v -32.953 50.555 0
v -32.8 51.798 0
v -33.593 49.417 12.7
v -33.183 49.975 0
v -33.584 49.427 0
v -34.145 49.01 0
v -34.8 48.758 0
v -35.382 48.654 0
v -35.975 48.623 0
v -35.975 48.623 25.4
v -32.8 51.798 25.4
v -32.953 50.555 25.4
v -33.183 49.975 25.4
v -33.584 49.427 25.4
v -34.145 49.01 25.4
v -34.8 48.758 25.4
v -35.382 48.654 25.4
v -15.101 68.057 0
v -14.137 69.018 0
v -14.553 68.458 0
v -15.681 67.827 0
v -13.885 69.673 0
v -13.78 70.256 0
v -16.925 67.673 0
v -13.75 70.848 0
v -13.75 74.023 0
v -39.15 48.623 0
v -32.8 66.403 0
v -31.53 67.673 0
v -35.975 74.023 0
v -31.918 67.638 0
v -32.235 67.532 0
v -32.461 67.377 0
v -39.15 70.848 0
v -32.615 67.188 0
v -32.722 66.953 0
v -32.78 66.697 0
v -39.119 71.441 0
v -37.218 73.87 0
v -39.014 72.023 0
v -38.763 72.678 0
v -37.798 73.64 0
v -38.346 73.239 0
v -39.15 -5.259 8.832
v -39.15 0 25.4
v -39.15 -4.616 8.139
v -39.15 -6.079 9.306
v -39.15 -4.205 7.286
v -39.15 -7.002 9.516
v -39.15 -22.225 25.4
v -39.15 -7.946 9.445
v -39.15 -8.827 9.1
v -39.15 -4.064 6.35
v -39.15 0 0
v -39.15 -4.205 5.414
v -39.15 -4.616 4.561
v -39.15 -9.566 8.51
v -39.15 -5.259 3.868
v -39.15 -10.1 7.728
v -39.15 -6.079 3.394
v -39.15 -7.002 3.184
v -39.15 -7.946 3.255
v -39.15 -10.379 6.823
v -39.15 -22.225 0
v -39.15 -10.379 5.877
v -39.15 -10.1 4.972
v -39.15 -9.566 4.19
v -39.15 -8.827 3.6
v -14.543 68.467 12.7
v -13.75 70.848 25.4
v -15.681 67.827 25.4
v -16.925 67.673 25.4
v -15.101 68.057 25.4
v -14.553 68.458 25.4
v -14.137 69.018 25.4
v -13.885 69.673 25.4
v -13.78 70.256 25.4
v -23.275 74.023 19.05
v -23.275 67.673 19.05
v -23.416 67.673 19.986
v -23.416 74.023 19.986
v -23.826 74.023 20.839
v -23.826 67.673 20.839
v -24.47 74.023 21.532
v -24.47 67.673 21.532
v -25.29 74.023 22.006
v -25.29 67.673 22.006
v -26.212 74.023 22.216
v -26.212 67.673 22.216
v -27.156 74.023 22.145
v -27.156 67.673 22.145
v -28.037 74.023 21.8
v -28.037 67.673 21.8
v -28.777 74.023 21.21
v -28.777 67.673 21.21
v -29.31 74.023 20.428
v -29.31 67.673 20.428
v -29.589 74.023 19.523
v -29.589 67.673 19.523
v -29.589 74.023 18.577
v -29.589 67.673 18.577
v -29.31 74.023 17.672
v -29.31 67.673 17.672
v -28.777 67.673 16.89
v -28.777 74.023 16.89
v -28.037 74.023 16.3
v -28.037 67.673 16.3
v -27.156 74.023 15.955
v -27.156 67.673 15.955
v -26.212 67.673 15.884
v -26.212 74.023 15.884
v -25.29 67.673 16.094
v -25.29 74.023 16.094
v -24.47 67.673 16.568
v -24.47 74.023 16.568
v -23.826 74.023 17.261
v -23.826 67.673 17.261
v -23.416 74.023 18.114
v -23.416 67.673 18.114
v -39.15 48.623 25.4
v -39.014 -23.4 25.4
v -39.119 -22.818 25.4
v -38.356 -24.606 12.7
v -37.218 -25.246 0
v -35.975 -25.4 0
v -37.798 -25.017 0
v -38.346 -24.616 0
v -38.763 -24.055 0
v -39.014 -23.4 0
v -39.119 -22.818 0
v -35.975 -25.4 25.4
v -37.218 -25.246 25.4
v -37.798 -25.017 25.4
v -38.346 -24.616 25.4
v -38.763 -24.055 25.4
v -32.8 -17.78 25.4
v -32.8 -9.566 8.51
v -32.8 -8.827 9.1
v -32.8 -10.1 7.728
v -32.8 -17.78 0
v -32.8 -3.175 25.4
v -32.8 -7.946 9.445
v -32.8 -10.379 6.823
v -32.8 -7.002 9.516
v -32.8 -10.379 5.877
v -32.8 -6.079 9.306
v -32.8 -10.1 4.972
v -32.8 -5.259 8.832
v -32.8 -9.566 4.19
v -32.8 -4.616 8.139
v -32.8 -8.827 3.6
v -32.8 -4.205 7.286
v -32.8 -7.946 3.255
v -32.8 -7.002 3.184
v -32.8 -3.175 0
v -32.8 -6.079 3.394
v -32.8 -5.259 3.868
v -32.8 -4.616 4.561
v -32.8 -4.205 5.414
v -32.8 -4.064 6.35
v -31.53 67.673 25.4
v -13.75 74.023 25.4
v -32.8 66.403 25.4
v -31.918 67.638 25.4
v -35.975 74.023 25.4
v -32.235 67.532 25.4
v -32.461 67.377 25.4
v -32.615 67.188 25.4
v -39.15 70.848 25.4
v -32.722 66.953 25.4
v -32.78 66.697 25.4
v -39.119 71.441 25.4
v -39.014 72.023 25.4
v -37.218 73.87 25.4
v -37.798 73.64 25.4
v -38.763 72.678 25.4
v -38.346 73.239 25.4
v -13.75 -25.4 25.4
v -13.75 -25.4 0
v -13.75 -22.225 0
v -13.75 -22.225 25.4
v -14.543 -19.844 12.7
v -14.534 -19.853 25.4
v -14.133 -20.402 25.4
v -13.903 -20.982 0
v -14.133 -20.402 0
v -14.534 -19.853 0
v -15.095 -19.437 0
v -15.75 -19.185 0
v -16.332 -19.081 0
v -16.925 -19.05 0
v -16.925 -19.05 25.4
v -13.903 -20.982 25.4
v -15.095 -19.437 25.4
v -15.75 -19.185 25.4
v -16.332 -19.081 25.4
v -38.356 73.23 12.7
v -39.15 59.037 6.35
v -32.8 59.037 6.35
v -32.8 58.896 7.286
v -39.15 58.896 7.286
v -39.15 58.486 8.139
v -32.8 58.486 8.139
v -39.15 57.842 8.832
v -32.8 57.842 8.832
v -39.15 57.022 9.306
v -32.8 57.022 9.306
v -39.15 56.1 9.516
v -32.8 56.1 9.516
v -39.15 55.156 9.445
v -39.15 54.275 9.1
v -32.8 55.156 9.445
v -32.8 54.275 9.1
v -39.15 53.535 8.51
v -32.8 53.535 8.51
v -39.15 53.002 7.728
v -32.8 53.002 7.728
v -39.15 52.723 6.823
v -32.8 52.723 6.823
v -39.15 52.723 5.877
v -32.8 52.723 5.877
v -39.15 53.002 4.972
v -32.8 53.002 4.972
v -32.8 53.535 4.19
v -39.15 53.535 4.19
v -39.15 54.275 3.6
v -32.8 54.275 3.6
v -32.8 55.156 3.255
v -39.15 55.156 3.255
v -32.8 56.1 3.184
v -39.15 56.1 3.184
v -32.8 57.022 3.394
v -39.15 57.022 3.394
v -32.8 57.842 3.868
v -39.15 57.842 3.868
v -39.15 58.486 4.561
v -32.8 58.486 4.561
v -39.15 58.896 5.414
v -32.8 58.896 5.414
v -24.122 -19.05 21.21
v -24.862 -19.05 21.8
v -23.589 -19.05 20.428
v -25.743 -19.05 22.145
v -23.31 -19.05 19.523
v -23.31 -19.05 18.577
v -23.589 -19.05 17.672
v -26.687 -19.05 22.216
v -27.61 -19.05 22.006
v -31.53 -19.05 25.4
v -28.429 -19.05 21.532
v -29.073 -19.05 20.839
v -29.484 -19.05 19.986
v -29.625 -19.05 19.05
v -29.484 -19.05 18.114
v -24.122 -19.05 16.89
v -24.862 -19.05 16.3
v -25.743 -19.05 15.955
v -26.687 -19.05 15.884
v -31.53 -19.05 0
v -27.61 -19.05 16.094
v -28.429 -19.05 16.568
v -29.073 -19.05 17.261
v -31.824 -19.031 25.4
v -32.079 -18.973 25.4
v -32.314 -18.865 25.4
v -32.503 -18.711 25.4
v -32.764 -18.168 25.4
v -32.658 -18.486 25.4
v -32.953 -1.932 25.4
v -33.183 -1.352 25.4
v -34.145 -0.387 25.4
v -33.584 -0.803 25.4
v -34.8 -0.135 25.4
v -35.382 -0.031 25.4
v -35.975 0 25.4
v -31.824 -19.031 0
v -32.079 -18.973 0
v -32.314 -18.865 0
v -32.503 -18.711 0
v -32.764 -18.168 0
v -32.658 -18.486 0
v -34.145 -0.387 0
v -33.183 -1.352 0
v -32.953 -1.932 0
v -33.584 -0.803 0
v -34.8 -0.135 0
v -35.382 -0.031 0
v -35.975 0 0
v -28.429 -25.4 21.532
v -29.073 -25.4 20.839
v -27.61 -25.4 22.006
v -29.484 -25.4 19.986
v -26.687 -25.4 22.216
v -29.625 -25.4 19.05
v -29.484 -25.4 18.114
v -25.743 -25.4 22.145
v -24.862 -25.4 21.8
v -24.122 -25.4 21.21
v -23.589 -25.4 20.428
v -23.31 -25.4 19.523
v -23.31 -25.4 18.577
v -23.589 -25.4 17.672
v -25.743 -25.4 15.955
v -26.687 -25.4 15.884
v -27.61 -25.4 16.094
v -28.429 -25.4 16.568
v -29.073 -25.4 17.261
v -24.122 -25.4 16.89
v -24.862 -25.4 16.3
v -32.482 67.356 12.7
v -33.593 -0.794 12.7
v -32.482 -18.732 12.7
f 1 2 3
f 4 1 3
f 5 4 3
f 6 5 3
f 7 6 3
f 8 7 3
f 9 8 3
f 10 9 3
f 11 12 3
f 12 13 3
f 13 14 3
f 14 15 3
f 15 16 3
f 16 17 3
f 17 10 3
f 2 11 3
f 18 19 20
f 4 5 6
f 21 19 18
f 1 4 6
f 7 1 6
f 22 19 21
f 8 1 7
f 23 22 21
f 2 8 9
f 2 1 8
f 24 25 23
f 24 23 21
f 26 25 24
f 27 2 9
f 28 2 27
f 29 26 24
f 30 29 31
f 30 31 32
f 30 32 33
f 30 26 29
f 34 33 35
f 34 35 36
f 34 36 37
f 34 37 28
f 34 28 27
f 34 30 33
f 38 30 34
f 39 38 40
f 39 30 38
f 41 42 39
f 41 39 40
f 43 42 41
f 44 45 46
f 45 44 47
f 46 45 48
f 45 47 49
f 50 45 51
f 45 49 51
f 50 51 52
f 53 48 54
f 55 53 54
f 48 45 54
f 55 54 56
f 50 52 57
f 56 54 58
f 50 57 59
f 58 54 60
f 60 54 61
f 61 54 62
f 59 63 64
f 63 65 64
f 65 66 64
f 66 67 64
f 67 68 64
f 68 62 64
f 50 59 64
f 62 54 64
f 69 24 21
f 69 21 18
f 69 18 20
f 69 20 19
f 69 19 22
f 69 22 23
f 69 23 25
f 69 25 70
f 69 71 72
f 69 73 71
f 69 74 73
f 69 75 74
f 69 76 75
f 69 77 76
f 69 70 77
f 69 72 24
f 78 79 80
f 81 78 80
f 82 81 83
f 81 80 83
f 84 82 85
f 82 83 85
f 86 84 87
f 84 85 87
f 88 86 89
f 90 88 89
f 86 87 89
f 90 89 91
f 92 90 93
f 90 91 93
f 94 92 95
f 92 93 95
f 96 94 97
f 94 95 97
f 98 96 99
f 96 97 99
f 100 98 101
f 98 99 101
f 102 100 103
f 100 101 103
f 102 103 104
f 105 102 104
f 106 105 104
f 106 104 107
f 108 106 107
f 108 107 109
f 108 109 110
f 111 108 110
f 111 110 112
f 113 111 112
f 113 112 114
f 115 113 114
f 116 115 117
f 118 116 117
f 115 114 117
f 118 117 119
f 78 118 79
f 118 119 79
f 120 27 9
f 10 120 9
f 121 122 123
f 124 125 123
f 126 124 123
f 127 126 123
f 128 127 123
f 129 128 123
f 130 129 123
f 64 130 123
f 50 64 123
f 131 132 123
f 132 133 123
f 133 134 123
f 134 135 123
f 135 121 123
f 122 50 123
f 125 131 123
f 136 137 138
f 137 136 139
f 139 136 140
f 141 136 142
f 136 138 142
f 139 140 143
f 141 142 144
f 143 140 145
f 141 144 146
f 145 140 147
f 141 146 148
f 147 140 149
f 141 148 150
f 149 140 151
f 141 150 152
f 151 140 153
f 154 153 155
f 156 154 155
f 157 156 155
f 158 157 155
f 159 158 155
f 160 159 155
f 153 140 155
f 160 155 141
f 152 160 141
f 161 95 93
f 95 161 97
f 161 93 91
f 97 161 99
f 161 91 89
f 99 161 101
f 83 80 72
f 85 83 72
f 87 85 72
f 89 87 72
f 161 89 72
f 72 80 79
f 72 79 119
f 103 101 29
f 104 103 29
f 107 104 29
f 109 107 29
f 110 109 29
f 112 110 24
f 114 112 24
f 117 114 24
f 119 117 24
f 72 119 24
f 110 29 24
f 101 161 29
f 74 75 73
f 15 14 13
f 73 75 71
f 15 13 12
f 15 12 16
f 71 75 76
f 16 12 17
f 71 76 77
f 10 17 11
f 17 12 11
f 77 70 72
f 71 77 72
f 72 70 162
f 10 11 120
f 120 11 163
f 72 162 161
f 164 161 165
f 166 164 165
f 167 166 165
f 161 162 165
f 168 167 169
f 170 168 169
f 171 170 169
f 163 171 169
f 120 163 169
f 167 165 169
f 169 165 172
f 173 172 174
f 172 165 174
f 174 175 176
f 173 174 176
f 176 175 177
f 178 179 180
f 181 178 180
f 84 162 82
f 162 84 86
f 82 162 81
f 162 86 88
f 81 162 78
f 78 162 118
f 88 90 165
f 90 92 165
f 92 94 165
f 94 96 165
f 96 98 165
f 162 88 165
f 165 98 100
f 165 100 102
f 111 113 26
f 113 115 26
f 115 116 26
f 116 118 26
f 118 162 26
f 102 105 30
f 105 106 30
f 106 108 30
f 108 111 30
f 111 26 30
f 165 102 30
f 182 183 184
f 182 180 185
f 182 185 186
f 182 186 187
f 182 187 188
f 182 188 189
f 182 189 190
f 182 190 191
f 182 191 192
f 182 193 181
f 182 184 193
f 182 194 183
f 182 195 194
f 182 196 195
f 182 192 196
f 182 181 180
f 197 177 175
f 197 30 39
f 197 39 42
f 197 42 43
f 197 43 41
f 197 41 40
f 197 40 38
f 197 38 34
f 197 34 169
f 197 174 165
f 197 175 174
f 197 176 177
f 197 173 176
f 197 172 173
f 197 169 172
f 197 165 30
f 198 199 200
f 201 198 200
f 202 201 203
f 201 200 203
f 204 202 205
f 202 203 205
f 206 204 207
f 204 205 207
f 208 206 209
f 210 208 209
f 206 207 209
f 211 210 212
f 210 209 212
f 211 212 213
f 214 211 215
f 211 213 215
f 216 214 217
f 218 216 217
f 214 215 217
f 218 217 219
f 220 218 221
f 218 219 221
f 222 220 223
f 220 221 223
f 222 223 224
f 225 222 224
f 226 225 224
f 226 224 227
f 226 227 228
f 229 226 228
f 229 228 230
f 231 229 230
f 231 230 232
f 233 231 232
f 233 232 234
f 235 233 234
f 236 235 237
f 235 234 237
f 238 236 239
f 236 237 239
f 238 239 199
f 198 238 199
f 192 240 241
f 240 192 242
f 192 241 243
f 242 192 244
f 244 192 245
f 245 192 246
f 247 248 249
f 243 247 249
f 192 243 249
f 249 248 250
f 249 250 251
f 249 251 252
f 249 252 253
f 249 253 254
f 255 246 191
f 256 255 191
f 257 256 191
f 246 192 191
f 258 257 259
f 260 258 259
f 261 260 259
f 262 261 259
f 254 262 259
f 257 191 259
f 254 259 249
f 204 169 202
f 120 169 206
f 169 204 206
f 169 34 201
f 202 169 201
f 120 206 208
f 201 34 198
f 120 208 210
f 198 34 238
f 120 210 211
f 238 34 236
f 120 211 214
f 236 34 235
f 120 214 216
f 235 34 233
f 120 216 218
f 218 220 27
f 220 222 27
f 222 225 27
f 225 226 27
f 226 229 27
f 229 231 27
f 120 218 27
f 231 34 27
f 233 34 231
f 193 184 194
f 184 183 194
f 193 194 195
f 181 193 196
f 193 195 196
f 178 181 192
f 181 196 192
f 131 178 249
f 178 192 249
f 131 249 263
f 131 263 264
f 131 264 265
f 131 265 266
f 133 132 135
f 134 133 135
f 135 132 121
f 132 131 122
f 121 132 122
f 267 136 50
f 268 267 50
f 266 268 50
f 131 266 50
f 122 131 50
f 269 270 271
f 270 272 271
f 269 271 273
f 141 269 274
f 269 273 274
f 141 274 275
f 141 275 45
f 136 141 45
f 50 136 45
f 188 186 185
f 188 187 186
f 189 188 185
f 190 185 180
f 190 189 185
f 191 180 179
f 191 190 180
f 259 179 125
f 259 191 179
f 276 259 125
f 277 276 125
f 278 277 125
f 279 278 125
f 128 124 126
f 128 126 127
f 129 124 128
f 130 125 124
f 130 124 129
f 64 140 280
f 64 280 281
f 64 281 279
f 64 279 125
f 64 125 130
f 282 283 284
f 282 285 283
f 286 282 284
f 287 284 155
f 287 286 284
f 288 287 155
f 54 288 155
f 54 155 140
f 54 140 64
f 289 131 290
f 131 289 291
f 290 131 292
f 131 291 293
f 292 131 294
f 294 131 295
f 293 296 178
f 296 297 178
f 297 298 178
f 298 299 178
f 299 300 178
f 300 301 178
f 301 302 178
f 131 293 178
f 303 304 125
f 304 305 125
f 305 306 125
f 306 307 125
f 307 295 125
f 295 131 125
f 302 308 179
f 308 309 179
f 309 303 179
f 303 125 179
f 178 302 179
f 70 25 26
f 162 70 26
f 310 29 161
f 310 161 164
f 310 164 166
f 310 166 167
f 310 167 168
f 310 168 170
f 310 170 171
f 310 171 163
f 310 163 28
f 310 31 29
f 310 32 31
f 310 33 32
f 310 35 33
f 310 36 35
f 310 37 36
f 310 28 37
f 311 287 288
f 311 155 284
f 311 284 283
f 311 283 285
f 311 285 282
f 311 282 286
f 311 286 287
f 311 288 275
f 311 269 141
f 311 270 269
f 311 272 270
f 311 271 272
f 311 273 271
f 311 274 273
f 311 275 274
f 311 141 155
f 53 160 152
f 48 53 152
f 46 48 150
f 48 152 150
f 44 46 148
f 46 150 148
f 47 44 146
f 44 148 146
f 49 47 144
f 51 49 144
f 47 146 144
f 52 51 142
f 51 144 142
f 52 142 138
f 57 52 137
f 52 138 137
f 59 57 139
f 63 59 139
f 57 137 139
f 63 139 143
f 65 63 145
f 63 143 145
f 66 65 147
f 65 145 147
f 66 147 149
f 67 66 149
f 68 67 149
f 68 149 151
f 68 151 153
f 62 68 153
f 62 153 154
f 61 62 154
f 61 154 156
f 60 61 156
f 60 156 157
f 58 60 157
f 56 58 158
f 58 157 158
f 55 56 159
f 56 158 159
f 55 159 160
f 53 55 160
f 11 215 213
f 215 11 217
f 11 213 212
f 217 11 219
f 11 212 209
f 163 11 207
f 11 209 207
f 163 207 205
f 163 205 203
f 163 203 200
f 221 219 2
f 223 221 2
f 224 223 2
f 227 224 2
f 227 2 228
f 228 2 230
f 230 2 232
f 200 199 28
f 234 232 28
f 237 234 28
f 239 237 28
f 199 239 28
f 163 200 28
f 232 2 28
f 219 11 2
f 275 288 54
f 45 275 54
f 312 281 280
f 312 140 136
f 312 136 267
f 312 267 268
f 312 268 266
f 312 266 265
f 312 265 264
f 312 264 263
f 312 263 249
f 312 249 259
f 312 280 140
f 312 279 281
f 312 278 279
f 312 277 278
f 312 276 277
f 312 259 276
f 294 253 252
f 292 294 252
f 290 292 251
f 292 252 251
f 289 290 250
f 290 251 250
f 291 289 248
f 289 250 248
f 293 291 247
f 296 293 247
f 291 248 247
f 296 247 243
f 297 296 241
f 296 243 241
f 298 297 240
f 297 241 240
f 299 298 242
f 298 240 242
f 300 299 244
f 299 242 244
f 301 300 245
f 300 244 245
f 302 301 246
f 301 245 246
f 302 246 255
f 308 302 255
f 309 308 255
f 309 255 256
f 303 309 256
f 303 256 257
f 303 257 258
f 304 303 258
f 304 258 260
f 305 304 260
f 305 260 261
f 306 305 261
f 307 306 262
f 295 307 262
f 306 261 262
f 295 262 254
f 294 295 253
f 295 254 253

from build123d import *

# Parameters (mm, degrees)
F1_DEPTH       = 25.4
F3_R           = 3.175
F4_DEPTH       = 6.35
F2_R           = 3.175
F5_DEPTH       = 6.35
F7_DEPTH       = 25.4
F8_R           = 3.175
F9_DEPTH       = 6.35
F10_R          = 3.175
F11_DEPTH      = 6.35
F12_T1_DEPTH   = 41.275
F12_2_T1_DEPTH = 41.275
F13_T1_DEPTH   = 41.275
F13_2_T1_DEPTH = 41.275
F14_T1_DEPTH   = 25.4
F14_2_T1_DEPTH = 25.4


# Not quite as in the source:
# - a fillet or chamfer that OpenCascade refuses, or shapes differently, is made with other operations: its cross-section is extruded or revolved along the edge and cut away or added


with BuildPart() as f1:
    # F0 (on Top) → F1 (new body)
    with BuildSketch(Plane.XY):
        Polygon((-32.7995864883, 0), (-39.1495864883, 0), (-39.1495864883, -25.4), (-13.7495864883, -25.4), (-13.7495864883, -19.05), (-32.7995864883, -19.05), align=None)
    extrude(amount=F1_DEPTH)

    # F3 (on face) → F4 (cut)
    with BuildSketch(Plane(origin=(0, -19.05, 0), x_dir=(-1, 0, 0), z_dir=(0, 1, 0))):
        with Locations((26.4495864883, 19.05)):
            Circle(F3_R)
    extrude(amount=-F4_DEPTH, mode=Mode.SUBTRACT)

    # F2 (on face) → F5 (cut)
    with BuildSketch(Plane.YZ.offset(-32.7995864883)):
        with Locations((-7.239, 6.35)):
            Circle(F2_R)
    extrude(amount=-F5_DEPTH, mode=Mode.SUBTRACT)

    # F12#2: fillet of radius 3.175 on 2 edges, made by hand

    # F12_2_s2 → F12_2_t1 (cut)
    with BuildSketch(Plane.XY.offset(-7.9375)):
        with BuildLine():
            add(Edge.make_bspline(
                [(-35.9745864883, 0), (-32.7995864883, 0), (-32.7995864883, -3.175)],
                knots=[0, 0, 0, 1, 1, 1], degree=2, weights=[1, 1, 1]))
            Line((-32.7995864883, -3.175), (-32.7995864883, 0))
            Line((-32.7995864883, 0), (-35.9745864883, 0))
        make_face()
        with BuildLine():
            add(Edge.make_bspline(
                [(-16.9245864883, -19.05), (-13.7495864883, -19.05), (-13.7495864883, -22.225)],
                knots=[0, 0, 0, 1, 1, 1], degree=2, weights=[1, 1, 1]))
            Line((-13.7495864883, -22.225), (-13.7495864883, -19.05))
            Line((-13.7495864883, -19.05), (-16.9245864883, -19.05))
        make_face()
    extrude(amount=F12_2_T1_DEPTH, mode=Mode.SUBTRACT)

    # F13: fillet of radius 3.175 on 1 edges, made by hand

    # F13_s2 → F13_t1 (cut)
    with BuildSketch(Plane.XY.offset(-7.9375)):
        with BuildLine():
            add(Edge.make_bspline(
                [(-39.1495864883, -22.225), (-39.1495864883, -25.4), (-35.9745864883, -25.4)],
                knots=[0, 0, 0, 1, 1, 1], degree=2, weights=[1, 1, 1]))
            Line((-35.9745864883, -25.4), (-39.1495864883, -25.4))
            Line((-39.1495864883, -25.4), (-39.1495864883, -22.225))
        make_face()
    extrude(amount=F13_T1_DEPTH, mode=Mode.SUBTRACT)

    # F14#2: fillet of radius 1.27 on 1 edges, made by hand

    # F14_2_s2 → F14_2_t1 (join)
    with BuildSketch(Plane.XY):
        with BuildLine():
            add(Edge.make_bspline(
                [(-32.7995864883, -17.78), (-32.7995864883, -19.05), (-31.5295864883, -19.05)],
                knots=[0, 0, 0, 1, 1, 1], degree=2, weights=[1, 1, 1]))
            Line((-31.5295864883, -19.05), (-32.7995864883, -19.05))
            Line((-32.7995864883, -19.05), (-32.7995864883, -17.78))
        make_face()
    extrude(amount=F14_2_T1_DEPTH)


with BuildPart() as f7:
    # F6 (on Top) → F7 (new body)
    with BuildSketch(Plane.XY):
        Polygon((-39.1495864883, 48.6232675612), (-32.7995864883, 48.6232675612), (-32.7995864883, 67.6732675612), (-13.7495864883, 67.6732675612), (-13.7495864883, 74.0232675612), (-39.1495864883, 74.0232675612), align=None)
    extrude(amount=F7_DEPTH)

    # F8 (on face) → F9 (cut)
    with BuildSketch(Plane.YZ.offset(-32.7995864883)):
        with Locations((55.8622675612, 6.35)):
            Circle(F8_R)
    extrude(amount=-F9_DEPTH, mode=Mode.SUBTRACT)

    # F10 (on face) → F11 (cut)
    with BuildSketch(Plane.XZ.offset(-67.6732675612)):
        with Locations((-26.4495864883, 19.05)):
            Circle(F10_R)
    extrude(amount=-F11_DEPTH, mode=Mode.SUBTRACT)

    # F12: fillet of radius 3.175 on 2 edges, made by hand

    # F12_s2 → F12_t1 (cut)
    with BuildSketch(Plane.XY.offset(-7.9375)):
        with BuildLine():
            add(Edge.make_bspline(
                [(-13.7495864883, 70.8482675612), (-13.7495864883, 67.6732675612), (-16.9245864883, 67.6732675612)],
                knots=[0, 0, 0, 1, 1, 1], degree=2, weights=[1, 1, 1]))
            Line((-16.9245864883, 67.6732675612), (-13.7495864883, 67.6732675612))
            Line((-13.7495864883, 67.6732675612), (-13.7495864883, 70.8482675612))
        make_face()
        with BuildLine():
            add(Edge.make_bspline(
                [(-35.9745864883, 48.6232675612), (-32.7995864883, 48.6232675612), (-32.7995864883, 51.7982675612)],
                knots=[0, 0, 0, 1, 1, 1], degree=2, weights=[1, 1, 1]))
            Line((-32.7995864883, 51.7982675612), (-32.7995864883, 48.6232675612))
            Line((-32.7995864883, 48.6232675612), (-35.9745864883, 48.6232675612))
        make_face()
    extrude(amount=F12_T1_DEPTH, mode=Mode.SUBTRACT)

    # F13#2: fillet of radius 3.175 on 1 edges, made by hand

    # F13_2_s2 → F13_2_t1 (cut)
    with BuildSketch(Plane.XY.offset(-7.9375)):
        with BuildLine():
            add(Edge.make_bspline(
                [(-39.1495864883, 70.8482675612), (-39.1495864883, 74.0232675612), (-35.9745864883, 74.0232675612)],
                knots=[0, 0, 0, 1, 1, 1], degree=2, weights=[1, 1, 1]))
            Line((-35.9745864883, 74.0232675612), (-39.1495864883, 74.0232675612))
            Line((-39.1495864883, 74.0232675612), (-39.1495864883, 70.8482675612))
        make_face()
    extrude(amount=F13_2_T1_DEPTH, mode=Mode.SUBTRACT)

    # F14: fillet of radius 1.27 on 1 edges, made by hand

    # F14_s2 → F14_t1 (join)
    with BuildSketch(Plane.XY):
        with BuildLine():
            add(Edge.make_bspline(
                [(-31.5295864883, 67.6732675612), (-32.7995864883, 67.6732675612), (-32.7995864883, 66.4032675612)],
                knots=[0, 0, 0, 1, 1, 1], degree=2, weights=[1, 1, 1]))
            Line((-32.7995864883, 66.4032675612), (-32.7995864883, 67.6732675612))
            Line((-32.7995864883, 67.6732675612), (-31.5295864883, 67.6732675612))
        make_face()
    extrude(amount=F14_T1_DEPTH)


solid = Compound([f1.part, f7.part])
